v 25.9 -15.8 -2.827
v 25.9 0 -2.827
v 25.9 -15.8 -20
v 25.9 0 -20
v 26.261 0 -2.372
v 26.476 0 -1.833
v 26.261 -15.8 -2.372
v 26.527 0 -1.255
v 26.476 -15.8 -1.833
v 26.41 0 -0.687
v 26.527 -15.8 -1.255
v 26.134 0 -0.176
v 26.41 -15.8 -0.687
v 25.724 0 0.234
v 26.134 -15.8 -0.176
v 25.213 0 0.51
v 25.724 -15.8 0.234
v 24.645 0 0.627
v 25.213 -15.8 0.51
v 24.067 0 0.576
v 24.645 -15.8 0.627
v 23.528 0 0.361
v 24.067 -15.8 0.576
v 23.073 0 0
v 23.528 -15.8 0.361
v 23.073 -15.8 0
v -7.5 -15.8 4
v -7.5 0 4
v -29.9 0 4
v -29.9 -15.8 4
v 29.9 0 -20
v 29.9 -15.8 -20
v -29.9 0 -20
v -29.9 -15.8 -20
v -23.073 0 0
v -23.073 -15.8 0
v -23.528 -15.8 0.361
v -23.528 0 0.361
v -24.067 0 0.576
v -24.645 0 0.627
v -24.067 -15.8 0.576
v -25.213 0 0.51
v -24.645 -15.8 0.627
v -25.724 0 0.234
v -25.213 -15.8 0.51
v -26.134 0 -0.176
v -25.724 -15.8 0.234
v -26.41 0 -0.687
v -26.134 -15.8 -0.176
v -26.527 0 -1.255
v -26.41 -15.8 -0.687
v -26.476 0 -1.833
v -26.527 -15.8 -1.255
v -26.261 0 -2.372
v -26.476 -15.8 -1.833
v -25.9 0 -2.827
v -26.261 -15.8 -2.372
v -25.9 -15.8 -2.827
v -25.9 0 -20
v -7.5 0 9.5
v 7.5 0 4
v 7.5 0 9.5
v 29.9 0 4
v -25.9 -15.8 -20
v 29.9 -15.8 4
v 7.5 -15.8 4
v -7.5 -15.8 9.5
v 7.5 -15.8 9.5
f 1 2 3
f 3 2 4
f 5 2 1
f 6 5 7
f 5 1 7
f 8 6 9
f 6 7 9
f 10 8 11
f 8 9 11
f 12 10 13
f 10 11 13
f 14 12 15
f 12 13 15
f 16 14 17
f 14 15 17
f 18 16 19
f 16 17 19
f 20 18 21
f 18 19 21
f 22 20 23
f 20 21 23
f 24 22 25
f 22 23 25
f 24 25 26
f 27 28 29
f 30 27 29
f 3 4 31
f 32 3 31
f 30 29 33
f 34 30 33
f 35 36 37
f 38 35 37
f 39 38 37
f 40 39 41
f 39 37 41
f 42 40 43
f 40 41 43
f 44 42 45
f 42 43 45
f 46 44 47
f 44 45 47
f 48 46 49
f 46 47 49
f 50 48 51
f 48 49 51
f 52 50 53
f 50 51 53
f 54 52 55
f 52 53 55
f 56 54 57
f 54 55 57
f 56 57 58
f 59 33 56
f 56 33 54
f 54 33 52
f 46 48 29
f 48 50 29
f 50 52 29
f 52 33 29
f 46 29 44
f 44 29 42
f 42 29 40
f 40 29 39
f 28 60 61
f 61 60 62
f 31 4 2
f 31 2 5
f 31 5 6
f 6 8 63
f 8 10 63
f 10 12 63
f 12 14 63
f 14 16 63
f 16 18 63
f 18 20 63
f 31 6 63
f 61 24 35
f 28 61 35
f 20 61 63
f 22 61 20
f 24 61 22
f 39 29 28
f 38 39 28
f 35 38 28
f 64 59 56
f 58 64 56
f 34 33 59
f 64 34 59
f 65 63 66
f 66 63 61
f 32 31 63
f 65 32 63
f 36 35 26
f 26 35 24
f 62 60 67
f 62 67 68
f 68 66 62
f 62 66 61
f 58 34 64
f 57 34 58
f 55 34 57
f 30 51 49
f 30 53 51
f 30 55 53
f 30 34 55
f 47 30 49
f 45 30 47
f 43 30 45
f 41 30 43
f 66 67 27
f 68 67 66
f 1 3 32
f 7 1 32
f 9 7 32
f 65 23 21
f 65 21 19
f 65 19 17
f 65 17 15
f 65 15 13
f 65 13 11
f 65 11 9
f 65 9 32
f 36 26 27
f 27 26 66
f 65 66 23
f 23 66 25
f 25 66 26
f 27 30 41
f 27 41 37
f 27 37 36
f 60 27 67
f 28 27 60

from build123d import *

# Parameters (mm, degrees)
F1_DEPTH = 15.8
F2_W     = 15
F2_H     = 15.8
F3_DEPTH = 5.5
F4_R     = 2
F5_DEPTH = 15.801


with BuildPart() as f1:
    # F0 (on Front) → F1 (new body)
    with BuildSketch(Plane.XZ):
        Polygon((-25.9, -20), (-25.9, 0), (25.9, 0), (25.9, -20), (29.9, -20), (29.9, 4), (-29.9, 4), (-29.9, -20), align=None)
    extrude(amount=F1_DEPTH)

    # F2 (on face) → F3 (join)
    with BuildSketch(Plane.XY.offset(4)):
        with Locations((0, -7.9)):
            Rectangle(F2_W, F2_H)
    extrude(amount=F3_DEPTH)

    # F4 (on face) → F5 (cut, through all)
    with BuildSketch(Plane.XZ.offset(15.8)):
        with Locations((-24.52996, -1.37004)):
            Circle(F4_R)
        with Locations((24.52996, -1.37004)):
            Circle(F4_R)
    extrude(amount=-F5_DEPTH, mode=Mode.SUBTRACT)


solid = f1.part
